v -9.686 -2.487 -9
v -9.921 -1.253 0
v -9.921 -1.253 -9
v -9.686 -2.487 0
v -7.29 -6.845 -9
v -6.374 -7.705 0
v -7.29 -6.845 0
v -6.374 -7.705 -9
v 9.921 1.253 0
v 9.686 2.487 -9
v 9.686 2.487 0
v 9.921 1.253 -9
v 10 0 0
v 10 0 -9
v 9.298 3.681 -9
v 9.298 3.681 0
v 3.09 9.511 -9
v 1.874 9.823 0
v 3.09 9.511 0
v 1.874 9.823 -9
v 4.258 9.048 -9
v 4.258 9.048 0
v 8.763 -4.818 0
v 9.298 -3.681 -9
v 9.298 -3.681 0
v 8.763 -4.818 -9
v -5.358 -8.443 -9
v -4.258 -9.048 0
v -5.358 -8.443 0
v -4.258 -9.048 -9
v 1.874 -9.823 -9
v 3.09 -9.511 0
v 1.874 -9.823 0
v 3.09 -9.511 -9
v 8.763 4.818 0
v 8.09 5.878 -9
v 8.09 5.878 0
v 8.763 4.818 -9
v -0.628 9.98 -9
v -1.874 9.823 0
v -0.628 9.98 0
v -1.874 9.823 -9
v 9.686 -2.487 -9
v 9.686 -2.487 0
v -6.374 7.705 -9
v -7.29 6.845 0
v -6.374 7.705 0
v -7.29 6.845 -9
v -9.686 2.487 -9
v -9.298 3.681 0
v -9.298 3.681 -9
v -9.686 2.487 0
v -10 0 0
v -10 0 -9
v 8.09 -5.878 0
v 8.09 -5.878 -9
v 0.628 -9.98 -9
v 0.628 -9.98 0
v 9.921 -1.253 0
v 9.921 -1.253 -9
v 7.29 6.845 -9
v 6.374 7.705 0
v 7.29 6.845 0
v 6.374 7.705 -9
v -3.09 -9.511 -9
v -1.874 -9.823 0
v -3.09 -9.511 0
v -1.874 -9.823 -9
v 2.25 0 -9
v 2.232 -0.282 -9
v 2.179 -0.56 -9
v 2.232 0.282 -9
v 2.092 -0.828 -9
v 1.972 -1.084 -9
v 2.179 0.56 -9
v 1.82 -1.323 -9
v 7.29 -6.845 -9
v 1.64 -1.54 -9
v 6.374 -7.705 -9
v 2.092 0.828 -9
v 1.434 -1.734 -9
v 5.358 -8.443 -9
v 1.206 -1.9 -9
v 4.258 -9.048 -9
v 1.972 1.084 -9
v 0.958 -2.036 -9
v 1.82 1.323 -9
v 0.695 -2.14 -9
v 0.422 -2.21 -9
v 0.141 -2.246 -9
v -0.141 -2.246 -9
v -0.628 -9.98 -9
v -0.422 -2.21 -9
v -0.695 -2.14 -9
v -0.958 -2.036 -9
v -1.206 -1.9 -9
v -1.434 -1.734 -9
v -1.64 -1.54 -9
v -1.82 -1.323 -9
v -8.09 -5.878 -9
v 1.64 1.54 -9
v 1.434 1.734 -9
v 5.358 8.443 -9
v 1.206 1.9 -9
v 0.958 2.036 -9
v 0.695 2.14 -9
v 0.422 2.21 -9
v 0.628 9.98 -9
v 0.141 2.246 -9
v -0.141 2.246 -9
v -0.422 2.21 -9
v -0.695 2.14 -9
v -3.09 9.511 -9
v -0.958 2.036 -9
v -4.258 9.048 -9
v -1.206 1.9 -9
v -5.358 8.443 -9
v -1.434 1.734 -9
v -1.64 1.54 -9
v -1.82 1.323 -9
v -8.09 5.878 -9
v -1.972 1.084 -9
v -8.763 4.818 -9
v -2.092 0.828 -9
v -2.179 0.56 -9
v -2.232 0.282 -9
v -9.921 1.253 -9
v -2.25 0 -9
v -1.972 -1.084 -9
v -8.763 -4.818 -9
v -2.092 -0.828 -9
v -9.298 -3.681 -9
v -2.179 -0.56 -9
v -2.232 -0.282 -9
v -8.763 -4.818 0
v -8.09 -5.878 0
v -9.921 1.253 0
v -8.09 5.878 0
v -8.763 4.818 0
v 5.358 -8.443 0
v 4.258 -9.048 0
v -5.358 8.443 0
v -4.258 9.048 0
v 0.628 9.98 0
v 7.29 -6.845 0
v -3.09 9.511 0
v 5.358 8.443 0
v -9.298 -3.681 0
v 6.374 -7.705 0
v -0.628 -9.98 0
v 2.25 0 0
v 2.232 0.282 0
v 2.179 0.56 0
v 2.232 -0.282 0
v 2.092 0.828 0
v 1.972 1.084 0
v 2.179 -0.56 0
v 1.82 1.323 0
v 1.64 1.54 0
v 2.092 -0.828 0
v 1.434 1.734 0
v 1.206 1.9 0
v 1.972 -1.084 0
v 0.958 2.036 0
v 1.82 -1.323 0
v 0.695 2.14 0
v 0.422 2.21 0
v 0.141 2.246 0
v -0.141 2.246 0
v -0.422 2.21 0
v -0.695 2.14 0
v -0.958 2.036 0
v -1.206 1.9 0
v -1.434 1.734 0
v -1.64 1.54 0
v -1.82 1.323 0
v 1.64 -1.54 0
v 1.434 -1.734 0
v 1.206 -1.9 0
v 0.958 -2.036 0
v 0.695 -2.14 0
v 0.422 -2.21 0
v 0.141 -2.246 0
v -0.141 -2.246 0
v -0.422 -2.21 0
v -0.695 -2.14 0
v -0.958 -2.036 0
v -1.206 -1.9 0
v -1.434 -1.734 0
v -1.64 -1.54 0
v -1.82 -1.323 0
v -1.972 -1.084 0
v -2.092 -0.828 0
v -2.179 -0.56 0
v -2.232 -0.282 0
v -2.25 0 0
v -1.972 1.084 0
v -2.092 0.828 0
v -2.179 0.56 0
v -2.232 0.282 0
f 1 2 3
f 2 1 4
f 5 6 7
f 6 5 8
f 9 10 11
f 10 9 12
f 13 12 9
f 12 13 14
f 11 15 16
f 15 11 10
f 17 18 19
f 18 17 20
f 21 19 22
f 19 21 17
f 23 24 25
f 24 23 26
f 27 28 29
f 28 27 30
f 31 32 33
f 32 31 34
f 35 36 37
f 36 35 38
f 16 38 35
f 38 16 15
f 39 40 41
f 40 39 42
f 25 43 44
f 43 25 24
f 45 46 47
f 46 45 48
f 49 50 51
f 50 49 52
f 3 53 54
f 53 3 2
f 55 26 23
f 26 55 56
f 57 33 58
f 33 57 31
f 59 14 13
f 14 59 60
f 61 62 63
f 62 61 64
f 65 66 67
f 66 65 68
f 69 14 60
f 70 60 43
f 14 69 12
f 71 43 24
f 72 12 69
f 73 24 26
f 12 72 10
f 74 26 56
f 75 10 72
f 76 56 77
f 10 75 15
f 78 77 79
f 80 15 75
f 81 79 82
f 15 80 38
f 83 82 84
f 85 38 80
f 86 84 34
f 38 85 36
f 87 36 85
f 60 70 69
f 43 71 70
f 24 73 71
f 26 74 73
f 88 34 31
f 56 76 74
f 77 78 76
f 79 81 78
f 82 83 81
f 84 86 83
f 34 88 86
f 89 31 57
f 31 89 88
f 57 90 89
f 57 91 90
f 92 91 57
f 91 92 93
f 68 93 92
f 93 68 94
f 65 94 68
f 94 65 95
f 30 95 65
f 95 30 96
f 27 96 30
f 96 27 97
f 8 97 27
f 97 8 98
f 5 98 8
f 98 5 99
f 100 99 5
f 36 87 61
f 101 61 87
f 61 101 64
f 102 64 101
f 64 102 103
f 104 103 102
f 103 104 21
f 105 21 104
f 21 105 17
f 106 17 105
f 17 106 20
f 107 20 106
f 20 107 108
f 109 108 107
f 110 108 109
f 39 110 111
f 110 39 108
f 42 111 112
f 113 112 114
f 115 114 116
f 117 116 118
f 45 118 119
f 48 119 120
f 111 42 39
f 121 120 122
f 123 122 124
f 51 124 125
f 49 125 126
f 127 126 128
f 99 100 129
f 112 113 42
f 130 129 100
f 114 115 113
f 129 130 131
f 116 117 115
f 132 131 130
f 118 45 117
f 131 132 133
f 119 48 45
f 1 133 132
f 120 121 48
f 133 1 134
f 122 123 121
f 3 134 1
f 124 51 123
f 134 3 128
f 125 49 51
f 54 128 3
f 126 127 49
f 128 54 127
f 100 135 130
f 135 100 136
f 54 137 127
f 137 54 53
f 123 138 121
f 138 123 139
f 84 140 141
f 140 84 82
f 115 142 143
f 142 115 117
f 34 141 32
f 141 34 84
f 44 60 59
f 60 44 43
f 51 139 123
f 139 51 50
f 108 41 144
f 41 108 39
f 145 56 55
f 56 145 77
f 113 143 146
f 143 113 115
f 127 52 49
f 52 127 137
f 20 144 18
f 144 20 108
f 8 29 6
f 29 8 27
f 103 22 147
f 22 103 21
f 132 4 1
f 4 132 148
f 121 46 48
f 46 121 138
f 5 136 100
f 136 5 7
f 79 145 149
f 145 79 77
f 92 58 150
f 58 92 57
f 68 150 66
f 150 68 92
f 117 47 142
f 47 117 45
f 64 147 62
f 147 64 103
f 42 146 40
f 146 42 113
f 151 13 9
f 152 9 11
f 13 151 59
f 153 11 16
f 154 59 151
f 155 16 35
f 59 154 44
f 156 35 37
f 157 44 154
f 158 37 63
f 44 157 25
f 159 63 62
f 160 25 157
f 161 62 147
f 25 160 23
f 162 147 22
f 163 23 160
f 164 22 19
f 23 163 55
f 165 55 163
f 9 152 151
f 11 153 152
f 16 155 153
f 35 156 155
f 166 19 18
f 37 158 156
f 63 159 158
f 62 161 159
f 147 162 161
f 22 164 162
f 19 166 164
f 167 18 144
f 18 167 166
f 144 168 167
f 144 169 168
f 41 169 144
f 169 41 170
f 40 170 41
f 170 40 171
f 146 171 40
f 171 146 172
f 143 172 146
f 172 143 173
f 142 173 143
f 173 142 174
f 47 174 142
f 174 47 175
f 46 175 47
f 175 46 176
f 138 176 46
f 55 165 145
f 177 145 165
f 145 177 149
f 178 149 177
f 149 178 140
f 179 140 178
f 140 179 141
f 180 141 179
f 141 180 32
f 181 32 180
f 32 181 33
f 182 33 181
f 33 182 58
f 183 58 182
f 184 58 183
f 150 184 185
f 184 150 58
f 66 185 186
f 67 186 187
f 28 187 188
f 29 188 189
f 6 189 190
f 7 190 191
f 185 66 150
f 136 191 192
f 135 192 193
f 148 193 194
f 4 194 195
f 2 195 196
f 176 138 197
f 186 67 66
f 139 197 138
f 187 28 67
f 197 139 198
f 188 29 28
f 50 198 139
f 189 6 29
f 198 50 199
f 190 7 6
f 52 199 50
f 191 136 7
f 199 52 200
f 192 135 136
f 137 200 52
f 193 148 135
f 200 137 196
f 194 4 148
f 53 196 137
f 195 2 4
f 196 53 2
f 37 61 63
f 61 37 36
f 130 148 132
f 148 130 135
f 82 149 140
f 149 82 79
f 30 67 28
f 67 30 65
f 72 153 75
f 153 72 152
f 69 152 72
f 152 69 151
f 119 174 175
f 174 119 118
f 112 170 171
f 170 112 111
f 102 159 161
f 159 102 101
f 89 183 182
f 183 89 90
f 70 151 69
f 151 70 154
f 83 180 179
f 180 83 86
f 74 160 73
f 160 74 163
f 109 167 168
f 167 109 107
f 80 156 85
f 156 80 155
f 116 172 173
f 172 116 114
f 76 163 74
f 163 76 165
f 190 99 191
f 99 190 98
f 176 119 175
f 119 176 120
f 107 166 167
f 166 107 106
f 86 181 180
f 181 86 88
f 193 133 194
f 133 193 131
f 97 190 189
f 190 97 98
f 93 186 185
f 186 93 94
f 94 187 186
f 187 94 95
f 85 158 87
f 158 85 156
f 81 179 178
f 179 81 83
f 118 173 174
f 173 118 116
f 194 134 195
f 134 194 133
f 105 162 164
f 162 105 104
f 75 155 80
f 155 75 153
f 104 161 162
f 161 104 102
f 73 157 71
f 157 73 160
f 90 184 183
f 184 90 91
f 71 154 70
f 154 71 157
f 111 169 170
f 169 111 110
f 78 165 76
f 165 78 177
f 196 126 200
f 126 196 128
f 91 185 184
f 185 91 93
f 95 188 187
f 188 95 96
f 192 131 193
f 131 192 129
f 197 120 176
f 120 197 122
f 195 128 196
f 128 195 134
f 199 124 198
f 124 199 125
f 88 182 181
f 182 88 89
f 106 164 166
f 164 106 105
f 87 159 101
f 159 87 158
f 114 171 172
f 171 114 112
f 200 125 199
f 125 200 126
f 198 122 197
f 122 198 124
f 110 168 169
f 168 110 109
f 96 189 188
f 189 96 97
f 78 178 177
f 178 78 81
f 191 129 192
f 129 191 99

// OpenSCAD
$fn = 50;


difference() {
	union() {
		translate(v = [0, 0, -9.0000000000]) {
			cylinder(h = 9, r = 10.0000000000);
		}
	}
	union() {
		#translate(v = [0, 0, -9]) {
			cylinder(h = 9, r = 2.2500000000);
		}
	}
}
